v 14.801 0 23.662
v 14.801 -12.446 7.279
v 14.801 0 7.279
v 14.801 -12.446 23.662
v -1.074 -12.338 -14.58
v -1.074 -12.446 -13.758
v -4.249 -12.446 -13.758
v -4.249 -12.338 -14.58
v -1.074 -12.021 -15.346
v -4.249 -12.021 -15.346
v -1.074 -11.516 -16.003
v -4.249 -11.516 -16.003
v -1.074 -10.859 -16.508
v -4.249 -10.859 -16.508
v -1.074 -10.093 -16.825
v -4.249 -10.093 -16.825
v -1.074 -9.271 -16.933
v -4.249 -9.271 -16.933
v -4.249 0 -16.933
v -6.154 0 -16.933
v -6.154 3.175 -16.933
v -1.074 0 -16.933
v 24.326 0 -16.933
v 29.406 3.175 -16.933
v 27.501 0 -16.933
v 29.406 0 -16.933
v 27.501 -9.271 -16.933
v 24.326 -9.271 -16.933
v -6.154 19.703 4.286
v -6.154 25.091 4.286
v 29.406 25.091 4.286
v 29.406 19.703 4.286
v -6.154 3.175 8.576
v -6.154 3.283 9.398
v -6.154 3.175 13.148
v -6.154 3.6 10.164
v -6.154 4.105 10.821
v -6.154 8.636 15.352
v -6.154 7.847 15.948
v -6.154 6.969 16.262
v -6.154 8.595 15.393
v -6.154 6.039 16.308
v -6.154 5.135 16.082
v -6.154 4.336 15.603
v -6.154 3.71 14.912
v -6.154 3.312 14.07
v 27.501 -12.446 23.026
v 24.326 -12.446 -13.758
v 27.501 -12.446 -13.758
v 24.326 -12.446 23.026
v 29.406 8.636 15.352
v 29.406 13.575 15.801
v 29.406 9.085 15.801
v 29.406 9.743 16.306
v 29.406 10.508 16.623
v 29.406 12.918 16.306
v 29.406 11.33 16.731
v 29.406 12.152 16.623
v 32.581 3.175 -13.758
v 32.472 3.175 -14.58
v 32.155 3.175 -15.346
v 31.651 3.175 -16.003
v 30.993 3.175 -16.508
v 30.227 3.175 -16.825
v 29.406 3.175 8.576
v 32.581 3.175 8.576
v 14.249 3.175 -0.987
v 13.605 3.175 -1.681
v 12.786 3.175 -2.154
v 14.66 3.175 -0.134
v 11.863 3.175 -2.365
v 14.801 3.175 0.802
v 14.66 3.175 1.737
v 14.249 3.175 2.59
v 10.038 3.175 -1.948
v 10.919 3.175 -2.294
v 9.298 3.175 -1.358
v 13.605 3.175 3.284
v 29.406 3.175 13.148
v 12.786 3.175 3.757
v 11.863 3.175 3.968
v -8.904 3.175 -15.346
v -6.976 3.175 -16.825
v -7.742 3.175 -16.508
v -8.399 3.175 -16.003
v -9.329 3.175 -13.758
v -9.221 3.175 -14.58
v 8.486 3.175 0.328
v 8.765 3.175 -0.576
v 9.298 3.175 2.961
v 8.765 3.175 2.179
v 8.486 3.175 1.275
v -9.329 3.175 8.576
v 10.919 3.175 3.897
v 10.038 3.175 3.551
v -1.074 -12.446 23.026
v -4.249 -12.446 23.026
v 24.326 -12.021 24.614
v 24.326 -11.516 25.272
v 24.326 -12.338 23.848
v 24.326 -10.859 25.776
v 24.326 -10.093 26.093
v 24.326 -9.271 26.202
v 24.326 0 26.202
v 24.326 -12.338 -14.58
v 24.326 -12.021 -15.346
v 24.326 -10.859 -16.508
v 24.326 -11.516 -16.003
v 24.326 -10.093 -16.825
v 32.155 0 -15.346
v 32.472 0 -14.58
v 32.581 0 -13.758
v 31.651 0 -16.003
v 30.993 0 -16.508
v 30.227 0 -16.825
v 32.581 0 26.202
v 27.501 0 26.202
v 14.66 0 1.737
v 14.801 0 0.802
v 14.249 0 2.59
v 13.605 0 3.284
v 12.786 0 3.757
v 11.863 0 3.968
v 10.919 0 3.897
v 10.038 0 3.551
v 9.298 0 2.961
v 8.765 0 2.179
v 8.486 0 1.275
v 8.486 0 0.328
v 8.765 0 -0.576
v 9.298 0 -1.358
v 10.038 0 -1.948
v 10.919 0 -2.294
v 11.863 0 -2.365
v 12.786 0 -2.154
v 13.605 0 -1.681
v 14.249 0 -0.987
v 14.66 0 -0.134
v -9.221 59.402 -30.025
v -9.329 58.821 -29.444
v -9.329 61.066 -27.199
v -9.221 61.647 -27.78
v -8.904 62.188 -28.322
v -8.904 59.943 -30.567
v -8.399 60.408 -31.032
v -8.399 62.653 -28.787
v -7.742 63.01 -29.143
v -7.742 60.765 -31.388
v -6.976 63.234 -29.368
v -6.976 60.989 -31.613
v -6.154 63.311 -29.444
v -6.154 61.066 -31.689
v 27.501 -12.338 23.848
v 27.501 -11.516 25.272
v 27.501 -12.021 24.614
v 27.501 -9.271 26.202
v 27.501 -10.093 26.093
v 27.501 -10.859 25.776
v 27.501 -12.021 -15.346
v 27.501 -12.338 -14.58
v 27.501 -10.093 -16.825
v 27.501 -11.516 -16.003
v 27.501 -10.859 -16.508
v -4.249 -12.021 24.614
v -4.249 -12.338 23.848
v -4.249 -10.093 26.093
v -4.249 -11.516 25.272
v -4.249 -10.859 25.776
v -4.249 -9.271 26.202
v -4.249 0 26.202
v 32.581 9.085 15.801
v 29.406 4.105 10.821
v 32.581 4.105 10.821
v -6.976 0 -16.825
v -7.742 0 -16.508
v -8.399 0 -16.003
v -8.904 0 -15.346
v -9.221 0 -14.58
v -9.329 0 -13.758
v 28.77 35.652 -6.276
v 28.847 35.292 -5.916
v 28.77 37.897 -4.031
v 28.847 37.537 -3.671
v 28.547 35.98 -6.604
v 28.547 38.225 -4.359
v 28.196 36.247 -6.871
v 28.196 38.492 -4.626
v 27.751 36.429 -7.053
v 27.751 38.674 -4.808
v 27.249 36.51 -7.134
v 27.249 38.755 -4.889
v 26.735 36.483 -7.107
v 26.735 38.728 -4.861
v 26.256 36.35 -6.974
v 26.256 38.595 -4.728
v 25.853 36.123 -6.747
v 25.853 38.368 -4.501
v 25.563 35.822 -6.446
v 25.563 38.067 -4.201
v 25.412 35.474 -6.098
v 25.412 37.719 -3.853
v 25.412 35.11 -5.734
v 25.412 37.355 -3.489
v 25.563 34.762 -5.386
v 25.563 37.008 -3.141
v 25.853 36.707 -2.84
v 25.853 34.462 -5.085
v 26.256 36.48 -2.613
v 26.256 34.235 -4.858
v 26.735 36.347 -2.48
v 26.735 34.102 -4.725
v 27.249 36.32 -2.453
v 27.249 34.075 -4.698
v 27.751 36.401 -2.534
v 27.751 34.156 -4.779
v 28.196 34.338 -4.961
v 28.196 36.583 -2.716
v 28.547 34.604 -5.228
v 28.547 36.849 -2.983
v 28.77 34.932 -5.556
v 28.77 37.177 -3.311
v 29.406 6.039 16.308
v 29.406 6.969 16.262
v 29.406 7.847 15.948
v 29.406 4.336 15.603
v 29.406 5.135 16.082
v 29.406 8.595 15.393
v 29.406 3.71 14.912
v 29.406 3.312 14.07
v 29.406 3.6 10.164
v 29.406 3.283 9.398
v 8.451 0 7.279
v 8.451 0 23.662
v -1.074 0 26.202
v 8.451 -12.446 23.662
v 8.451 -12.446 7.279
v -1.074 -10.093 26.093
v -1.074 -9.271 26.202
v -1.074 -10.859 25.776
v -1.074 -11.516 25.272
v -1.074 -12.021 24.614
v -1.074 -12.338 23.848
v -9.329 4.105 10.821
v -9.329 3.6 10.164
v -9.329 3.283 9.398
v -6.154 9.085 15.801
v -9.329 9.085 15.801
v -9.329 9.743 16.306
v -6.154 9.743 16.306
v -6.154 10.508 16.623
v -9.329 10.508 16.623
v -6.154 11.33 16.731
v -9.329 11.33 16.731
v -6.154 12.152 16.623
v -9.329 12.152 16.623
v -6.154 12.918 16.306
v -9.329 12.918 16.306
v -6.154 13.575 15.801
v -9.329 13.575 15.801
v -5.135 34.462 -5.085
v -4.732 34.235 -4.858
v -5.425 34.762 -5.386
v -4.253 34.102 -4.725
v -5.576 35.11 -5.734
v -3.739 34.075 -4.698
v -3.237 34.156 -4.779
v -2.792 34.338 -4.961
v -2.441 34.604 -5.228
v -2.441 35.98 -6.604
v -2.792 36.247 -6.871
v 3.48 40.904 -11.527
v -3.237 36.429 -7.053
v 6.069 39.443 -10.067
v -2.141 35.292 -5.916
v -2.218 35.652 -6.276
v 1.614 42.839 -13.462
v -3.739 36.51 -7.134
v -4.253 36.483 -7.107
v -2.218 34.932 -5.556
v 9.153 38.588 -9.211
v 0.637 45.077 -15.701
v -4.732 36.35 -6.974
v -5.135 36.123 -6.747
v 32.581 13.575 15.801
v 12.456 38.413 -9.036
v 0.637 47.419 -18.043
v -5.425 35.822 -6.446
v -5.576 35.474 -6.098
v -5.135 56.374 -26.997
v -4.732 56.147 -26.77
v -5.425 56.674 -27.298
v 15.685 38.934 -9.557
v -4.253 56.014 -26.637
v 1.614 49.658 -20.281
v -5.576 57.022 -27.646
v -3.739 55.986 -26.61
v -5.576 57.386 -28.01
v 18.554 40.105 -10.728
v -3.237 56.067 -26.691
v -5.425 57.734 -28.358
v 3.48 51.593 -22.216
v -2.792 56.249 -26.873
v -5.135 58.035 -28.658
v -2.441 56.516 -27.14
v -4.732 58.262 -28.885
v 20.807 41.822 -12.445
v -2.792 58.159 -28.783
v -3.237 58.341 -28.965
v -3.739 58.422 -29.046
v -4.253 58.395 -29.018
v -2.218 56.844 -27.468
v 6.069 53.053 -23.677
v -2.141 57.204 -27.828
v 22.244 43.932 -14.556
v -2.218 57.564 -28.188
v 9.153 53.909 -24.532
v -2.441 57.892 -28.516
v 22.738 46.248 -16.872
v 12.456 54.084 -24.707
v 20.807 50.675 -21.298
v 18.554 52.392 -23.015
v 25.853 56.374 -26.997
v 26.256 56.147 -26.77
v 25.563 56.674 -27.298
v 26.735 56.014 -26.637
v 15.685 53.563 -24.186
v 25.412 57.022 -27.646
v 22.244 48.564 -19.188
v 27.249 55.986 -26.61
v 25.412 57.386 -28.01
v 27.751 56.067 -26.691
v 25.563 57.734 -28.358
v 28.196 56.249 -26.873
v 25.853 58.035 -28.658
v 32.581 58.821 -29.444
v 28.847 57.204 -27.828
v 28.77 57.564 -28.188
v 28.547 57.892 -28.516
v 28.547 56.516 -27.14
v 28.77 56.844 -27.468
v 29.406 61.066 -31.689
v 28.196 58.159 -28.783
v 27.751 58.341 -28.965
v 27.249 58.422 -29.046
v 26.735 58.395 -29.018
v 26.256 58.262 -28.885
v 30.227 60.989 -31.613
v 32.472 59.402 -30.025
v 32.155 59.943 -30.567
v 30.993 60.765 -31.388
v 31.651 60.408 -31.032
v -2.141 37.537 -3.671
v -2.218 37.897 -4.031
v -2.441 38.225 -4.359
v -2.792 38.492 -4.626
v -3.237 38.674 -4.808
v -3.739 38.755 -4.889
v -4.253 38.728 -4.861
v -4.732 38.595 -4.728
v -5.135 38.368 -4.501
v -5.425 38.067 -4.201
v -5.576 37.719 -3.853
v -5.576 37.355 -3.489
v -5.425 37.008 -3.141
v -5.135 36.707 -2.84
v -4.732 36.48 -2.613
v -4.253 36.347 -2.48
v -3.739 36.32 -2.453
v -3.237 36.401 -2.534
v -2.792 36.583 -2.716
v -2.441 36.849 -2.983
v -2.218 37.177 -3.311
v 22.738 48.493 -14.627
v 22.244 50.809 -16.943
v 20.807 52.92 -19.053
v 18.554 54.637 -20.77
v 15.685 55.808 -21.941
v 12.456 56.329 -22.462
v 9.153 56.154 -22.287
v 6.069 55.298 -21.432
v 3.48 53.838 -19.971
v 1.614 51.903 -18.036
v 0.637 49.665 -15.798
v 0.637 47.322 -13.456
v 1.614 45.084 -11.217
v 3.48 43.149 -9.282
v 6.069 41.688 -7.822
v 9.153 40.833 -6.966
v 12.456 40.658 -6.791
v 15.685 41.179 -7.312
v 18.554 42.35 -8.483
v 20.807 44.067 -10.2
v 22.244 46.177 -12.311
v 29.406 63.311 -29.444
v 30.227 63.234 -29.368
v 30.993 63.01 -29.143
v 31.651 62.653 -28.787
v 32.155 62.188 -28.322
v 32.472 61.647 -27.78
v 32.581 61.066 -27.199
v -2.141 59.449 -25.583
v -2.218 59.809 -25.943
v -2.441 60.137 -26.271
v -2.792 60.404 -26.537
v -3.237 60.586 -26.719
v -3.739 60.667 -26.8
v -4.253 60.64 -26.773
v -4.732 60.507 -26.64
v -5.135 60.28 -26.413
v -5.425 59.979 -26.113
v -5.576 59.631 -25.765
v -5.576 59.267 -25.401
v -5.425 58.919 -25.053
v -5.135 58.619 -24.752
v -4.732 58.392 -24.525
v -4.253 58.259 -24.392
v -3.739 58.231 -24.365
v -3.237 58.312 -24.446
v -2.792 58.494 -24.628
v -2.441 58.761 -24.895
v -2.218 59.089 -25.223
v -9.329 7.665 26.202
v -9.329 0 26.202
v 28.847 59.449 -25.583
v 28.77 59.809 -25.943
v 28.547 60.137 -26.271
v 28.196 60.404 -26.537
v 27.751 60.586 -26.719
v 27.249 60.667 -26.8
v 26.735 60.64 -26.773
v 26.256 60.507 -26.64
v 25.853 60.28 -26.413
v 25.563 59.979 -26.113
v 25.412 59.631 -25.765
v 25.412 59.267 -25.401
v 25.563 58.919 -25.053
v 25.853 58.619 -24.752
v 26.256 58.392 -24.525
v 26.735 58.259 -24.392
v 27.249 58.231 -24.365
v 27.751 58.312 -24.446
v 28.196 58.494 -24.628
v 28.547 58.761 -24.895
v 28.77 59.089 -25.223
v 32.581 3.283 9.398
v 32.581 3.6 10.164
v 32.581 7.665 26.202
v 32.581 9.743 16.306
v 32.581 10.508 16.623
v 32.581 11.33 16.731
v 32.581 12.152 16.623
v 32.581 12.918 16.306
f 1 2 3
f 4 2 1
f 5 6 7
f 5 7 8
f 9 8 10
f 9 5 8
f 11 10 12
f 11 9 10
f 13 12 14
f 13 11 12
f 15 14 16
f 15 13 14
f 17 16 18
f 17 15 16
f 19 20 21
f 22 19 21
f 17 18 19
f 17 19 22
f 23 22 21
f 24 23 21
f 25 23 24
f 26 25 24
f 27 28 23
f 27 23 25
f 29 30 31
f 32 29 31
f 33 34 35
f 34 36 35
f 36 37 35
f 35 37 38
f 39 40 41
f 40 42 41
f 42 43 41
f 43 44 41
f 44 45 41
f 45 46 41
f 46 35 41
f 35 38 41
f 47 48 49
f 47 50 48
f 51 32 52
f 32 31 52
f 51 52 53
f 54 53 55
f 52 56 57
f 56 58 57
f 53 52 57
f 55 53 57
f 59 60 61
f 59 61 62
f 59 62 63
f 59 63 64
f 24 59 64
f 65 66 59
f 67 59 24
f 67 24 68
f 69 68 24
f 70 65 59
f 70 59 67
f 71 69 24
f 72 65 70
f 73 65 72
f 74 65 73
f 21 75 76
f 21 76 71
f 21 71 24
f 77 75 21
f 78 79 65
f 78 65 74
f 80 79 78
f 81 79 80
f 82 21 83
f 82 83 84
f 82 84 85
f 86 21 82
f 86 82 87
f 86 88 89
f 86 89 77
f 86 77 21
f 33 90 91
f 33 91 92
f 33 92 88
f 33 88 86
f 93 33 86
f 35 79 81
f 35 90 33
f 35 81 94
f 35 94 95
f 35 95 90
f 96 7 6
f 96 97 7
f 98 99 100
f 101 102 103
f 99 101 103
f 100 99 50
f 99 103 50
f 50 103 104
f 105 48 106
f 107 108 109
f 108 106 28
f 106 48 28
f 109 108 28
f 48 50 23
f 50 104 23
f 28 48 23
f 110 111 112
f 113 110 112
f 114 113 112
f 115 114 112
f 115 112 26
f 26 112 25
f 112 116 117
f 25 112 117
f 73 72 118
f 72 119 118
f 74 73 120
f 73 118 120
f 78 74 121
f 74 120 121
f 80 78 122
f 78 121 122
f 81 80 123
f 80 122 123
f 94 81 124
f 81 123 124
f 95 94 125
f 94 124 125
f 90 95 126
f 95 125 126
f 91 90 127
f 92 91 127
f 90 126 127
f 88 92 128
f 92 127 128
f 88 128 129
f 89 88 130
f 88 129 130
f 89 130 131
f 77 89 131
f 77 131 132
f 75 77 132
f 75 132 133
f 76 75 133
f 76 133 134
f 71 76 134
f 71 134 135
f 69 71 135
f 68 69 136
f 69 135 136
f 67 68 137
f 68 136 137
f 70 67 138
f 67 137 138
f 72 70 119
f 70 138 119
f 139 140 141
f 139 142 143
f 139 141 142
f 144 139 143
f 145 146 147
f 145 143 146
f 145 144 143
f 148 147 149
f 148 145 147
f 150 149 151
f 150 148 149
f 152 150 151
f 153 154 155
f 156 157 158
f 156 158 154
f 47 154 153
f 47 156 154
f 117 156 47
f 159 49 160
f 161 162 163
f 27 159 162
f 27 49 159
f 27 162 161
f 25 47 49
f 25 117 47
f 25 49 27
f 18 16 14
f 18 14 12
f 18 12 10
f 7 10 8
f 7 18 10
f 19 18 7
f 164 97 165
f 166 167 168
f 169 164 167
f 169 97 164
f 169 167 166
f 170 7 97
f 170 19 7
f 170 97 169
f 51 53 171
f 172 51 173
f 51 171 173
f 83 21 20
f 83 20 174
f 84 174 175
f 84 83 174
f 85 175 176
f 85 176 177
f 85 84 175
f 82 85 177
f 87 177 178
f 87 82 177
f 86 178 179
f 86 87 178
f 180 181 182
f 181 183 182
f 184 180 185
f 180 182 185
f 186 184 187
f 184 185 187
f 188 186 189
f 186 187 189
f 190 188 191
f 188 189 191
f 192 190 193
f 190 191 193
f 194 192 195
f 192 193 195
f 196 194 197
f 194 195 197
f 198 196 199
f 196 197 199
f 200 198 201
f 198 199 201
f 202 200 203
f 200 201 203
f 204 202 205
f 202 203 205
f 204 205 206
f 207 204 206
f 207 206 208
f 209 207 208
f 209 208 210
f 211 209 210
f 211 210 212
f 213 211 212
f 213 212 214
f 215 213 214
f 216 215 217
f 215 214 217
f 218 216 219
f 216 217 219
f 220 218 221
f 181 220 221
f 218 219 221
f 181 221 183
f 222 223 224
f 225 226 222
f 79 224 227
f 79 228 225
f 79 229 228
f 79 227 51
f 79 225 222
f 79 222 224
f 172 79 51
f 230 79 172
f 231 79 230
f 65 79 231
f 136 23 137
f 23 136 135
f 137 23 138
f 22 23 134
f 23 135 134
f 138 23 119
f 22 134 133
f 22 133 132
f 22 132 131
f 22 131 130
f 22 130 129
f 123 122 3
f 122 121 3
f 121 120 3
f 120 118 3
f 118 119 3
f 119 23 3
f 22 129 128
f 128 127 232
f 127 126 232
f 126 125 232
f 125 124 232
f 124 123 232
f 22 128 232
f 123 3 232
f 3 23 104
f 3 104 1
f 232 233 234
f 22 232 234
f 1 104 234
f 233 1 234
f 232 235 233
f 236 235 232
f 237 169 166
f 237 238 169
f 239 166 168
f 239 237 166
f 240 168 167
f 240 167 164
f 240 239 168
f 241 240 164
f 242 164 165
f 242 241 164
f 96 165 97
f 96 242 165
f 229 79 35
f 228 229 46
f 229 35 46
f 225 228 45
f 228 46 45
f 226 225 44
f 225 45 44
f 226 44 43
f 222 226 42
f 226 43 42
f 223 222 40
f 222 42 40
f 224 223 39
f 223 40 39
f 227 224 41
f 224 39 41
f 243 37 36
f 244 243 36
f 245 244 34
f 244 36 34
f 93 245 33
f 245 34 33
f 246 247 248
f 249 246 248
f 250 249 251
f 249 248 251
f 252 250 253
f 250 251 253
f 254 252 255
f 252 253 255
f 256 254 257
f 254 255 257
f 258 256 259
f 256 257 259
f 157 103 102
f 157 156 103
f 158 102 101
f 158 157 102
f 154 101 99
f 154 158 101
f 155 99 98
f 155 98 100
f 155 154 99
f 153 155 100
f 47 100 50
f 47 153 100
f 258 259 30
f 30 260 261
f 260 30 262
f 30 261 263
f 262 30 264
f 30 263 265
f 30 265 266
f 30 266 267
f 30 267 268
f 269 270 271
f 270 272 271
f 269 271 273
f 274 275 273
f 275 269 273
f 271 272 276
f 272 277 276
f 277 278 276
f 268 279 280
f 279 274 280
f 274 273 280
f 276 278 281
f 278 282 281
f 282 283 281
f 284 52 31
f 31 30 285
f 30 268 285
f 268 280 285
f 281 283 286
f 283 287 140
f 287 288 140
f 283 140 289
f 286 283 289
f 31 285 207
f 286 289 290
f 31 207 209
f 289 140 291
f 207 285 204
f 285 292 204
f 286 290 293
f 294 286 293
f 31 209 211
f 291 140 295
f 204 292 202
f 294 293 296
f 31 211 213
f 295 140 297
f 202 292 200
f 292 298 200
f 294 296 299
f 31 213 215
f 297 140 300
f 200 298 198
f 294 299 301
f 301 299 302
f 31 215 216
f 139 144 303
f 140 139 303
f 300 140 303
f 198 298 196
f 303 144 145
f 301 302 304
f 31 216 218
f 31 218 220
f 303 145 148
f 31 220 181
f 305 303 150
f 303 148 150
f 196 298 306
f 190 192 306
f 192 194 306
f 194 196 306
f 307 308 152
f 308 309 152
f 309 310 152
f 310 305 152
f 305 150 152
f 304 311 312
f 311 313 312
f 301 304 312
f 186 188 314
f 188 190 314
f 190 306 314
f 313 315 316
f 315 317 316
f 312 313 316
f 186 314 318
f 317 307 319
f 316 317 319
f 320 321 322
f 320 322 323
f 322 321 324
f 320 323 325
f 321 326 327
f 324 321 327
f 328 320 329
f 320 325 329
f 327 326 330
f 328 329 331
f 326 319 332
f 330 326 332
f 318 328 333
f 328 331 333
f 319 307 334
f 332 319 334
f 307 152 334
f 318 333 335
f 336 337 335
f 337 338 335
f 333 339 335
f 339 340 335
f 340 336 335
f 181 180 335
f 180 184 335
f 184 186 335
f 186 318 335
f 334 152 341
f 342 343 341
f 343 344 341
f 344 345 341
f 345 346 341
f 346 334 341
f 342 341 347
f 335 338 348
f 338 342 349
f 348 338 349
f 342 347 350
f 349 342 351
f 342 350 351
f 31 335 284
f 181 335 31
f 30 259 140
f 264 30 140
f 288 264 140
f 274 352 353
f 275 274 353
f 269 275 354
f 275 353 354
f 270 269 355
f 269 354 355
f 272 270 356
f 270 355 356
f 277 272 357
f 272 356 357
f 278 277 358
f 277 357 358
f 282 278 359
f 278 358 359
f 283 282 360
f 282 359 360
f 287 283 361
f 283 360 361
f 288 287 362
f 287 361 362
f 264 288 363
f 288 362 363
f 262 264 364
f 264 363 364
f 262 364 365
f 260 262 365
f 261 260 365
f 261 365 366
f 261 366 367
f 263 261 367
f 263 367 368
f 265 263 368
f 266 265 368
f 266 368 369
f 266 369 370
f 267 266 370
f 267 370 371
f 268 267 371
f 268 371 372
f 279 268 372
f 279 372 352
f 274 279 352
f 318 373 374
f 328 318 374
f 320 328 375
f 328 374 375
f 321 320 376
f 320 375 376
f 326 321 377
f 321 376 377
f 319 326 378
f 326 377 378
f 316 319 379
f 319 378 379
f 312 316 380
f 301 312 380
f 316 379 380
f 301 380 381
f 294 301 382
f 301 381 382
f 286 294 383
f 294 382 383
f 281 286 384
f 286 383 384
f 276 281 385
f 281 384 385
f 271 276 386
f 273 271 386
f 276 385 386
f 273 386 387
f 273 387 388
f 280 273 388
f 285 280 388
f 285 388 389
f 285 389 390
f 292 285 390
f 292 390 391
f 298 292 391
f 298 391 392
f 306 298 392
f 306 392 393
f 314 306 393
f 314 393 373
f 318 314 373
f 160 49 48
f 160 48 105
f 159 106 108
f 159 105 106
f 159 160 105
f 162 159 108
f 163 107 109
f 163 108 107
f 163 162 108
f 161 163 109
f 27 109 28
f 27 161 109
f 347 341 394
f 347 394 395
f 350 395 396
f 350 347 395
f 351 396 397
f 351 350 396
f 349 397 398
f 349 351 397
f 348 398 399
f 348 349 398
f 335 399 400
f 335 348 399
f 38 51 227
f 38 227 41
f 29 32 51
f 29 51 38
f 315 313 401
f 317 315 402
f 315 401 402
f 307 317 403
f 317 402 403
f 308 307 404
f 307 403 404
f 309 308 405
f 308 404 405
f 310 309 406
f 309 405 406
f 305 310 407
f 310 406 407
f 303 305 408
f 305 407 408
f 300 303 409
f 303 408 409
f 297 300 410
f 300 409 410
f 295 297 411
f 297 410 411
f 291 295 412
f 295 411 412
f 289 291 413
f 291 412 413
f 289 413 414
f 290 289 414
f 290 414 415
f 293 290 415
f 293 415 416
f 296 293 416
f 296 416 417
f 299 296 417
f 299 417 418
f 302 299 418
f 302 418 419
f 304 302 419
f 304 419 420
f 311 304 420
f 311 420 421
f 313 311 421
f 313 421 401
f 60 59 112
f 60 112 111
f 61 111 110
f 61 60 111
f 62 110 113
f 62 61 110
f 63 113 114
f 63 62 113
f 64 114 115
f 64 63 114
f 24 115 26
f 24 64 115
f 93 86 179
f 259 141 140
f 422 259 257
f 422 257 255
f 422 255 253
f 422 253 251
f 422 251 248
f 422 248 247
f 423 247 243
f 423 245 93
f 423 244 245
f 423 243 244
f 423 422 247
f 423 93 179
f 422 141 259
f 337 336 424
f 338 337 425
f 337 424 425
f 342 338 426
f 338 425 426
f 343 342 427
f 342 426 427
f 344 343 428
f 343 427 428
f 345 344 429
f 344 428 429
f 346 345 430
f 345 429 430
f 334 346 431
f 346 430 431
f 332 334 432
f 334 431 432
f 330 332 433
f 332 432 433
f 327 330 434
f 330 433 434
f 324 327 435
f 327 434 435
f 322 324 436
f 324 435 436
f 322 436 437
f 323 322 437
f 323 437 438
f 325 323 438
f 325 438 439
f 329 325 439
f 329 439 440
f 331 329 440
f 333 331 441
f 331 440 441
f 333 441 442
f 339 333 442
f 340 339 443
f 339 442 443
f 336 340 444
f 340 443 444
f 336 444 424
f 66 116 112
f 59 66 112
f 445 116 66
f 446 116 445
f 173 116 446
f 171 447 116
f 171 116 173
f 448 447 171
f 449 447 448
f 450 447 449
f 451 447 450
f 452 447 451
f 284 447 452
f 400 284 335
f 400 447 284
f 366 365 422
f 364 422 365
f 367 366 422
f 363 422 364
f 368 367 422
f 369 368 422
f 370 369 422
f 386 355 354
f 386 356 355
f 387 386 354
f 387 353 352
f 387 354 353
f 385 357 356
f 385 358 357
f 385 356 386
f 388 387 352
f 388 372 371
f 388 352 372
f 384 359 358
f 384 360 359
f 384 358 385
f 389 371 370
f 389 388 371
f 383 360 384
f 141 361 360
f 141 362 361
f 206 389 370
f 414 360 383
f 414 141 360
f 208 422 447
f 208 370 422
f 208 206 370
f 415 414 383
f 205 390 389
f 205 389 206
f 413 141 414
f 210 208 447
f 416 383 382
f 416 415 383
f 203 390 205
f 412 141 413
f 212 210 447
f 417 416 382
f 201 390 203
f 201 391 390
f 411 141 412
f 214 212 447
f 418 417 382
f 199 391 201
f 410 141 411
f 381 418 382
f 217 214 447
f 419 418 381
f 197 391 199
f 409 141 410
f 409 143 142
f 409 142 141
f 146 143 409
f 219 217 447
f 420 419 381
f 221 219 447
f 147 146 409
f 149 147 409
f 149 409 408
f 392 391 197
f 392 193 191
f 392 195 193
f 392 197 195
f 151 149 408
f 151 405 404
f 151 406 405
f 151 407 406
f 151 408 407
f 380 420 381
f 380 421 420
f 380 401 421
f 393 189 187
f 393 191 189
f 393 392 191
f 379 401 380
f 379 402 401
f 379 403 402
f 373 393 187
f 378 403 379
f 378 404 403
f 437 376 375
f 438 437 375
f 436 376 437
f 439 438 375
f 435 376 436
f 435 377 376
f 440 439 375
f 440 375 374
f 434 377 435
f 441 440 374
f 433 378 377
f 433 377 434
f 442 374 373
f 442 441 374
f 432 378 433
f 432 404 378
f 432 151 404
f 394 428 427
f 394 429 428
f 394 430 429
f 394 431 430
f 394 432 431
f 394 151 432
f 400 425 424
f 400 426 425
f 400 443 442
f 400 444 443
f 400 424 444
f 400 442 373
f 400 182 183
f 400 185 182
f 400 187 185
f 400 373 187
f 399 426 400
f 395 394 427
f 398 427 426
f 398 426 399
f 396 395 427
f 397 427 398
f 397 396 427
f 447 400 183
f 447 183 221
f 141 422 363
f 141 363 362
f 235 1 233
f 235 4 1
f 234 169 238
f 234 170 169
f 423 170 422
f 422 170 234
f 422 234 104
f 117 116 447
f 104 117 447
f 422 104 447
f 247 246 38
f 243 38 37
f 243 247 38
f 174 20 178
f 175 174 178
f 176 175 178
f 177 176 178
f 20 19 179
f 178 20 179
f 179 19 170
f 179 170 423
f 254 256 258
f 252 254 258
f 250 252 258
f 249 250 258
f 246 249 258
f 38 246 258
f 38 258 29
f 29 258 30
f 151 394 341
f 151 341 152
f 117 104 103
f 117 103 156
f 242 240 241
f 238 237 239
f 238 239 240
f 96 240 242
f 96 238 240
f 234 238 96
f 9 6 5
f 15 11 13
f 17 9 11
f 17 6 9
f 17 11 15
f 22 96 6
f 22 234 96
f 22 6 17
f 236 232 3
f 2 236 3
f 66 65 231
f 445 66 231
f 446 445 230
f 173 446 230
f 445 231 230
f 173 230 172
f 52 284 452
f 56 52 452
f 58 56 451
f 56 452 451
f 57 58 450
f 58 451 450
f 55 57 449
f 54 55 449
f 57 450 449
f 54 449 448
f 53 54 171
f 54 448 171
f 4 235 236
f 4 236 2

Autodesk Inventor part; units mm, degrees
ref_plane "YZ Plane" through (0, 0, 0) normal (1, 0, 0) x (0, 1, 0)
ref_plane "XZ Plane" through (0, 0, 0) normal (0, 1, 0) x (-1, 0, 0)
ref_plane "XY Plane" through (0, 0, 0) normal (0, 0, 1) x (1, 0, 0)
sketch "Sketch1" plane through (0, 0, 0) normal (0, 1, 0) x (-1, 0, 0)
  line L0 (9.3294, -16.9333) -> (-32.5806, -16.9333)
  line L1 (-32.5806, -16.9333) -> (-32.5806, 33.8667)
  line L2 (-32.5806, 33.8667) -> (9.3294, 33.8667)
  line L3 (9.3294, 33.8667) -> (9.3294, -16.9333)
  point P0 (0, 0)
  dimension "d0" = 50.8
  dimension "d1" = 41.91
extrude "Extrusion1" add sketch "Sketch1" along normal blind 3.175
chamfer "Chamfer1" distance 3.175 angle 45 1 edges at (11.6256, 3.175, 33.8667)
sketch "Sketch9" plane through (32.5806, 0, -16.9333) normal (1, 0, 0) x (0, 0, -1)
  line L0 (-47.625, 3.175) -> (0, 3.175) projected
  line L1 (-11.631, 34.6788) -> (-43.1349, 3.175) projected
  line L2 (-13.8761, 36.9239) -> (-11.631, 34.6788) projected
  line L3 (-34.9797, 11.3302) -> (-26.8245, 3.175)
  point P0 (-16.9333, 0)
  dimension "d15" = 33.02
extrude "Extrusion4" add sketch "Sketch9" against normal blind 3.175
sketch "Sketch10" plane through (-9.3294, 0, -16.9333) normal (-1, 0, 0) x (0, 0, 1)
  line L0 (0, 3.175) -> (47.625, 3.175) projected
  line L1 (13.8761, 36.9239) -> (11.631, 34.6788) projected
  line L2 (43.1349, 3.175) -> (11.631, 34.6788) projected
  line L3 (34.9797, 11.3302) -> (26.8245, 3.175)
  point P0 (16.9333, 0)
  dimension "d18" = 33.02
extrude "Extrusion5" add sketch "Sketch10" against normal blind 3.175
fillet "Fillet3" radius 3.175 2 edges at (-7.7419, 3.175, 9.8912) (30.9931, 3.175, 9.8912)
fillet "Fillet4" radius 3.175 2 edges at (-9.3294, 1.5875, -16.9333) (32.5806, 1.5875, -16.9333)
sketch "Sketch11" plane through (0, 0, 0) normal (0, -1, 0) x (1, 0, 0)
  line L0 (-9.3294, 26.2015) -> (32.5806, 26.2015) projected
  line L1 (-9.3294, 33.8667) -> (-9.3294, -13.7583) projected
  line L2 (-6.1544, -16.9333) -> (29.4056, -16.9333) projected
  line L3 (32.5806, -13.7583) -> (32.5806, 33.8667) projected
  line L4 (11.6256, 26.2015) -> (11.6256, -16.9333)
  line L5 (-9.3294, 0.8015) -> (32.5806, 0.8015)
  circle A0 centre (11.6256, 0.8015) radius 3.175
  point P0 (0, 0)
  dimension "d24" = 20.955
  dimension "d25" = 25.4
  dimension "d26" = 6.35
extrude "Extrusion9" cut sketch "Sketch11" against normal blind 12.446 contours A0 L5 L4 | L4 L5 A0 | L5 L4 A0 | L5 A0 L4
sketch "Sketch19" plane through (0, 0, 0) normal (0, -1, 0) x (1, 0, 0)
  circle A0 centre (11.6256, 0.8015) radius 3.175 projected
  circle A1 centre (11.6256, -9.3585) radius 3.175
  point P0 (0, 0)
  dimension "d44" = 6.35
  dimension "d45" = 10.16
  dimension "d46" = 0
extrude "Extrusion10" add sketch "Sketch19" along normal blind 12.446 contours A1
sketch "Sketch20" plane through (0, 0, 0) normal (0, -1, 0) x (1, 0, 0)
  circle A0 centre (11.6256, 0.8015) radius 3.175 projected
  circle A1 centre (11.6256, 10.9615) radius 3.175
  point P0 (0, 0)
  dimension "d49" = 6.35
  dimension "d50" = 10.16
  dimension "d51" = 0
extrude "Extrusion11" add sketch "Sketch20" along normal blind 12.446 contours A1
sketch "Sketch24" plane through (0, 0, 0) normal (0, -1, 0) x (1, 0, 0)
  circle A0 centre (11.6256, 0.8015) radius 3.175 projected
  line L0 (-9.3294, 26.2015) -> (32.5806, 26.2015) projected
  line L1 (-6.1544, -16.9333) -> (29.4056, -16.9333) projected
  line L2 (24.3256, 26.2015) -> (24.3256, -16.9333)
  line L3 (24.3256, 26.2015) -> (27.5006, 26.2015)
  line L4 (27.5006, 26.2015) -> (27.5006, -16.9333)
  line L5 (27.5006, -16.9333) -> (24.3256, -16.9333)
  line L6 (24.3256, -16.9333) -> (24.3256, 26.2015)
  point P0 (0, 0)
  dimension "d64" = 12.7
  dimension "d65" = 3.175
extrude "Extrusion14" add sketch "Sketch24" along normal blind 12.446 contours L0 L4 L1 L2
sketch "Sketch25" plane through (0, 0, 0) normal (0, -1, 0) x (1, 0, 0)
  circle A0 centre (11.6256, 0.8015) radius 3.175 projected
  line L0 (-9.3294, 26.2015) -> (24.3256, 26.2015) projected
  line L1 (-6.1544, -16.9333) -> (24.3256, -16.9333) projected
  line L2 (-1.0744, 26.2015) -> (-1.0744, -16.9333)
  line L3 (-1.0744, -16.9333) -> (-4.2494, -16.9333)
  line L4 (-4.2494, -16.9333) -> (-4.2494, 26.2015)
  line L5 (-4.2494, 26.2015) -> (-1.0744, 26.2015)
  line L6 (-1.0744, 26.2015) -> (-1.0744, -16.9333)
  point P0 (0, 0)
  dimension "d68" = 12.7
  dimension "d69" = 3.175
extrude "Extrusion15" add sketch "Sketch25" along normal blind 12.446 contours L0 L2 L1 L4
fillet "Fillet8" radius 3.175 4 edges at (25.9131, -12.446, 26.2015) (25.9131, -12.446, -16.9333) (-2.6619, -12.446, -16.9333) (-2.6619, -12.446, 26.2015)
sketch "Sketch28" plane through (-9.3294, 3.175, 30.6917) normal (0, 0.7071068, 0.7071068) x (1, 0, 0)
  line L0 (41.91, -4.4901) -> (41.91, 0) projected
  line L1 (41.91, 0) -> (0, 0) projected
  line L2 (0, 0) -> (0, -4.4901) projected
  line L3 (41.91, -4.4901) -> (0, -4.4901) projected
  line L4 (0, -4.4901) -> (41.91, -4.4901)
  line L5 (41.91, -4.4901) -> (41.91, 85.0449)
  line L6 (41.91, 85.0449) -> (0, 85.0449)
  line L7 (0, 85.0449) -> (0, -4.4901)
  point P0 (9.3294, 19.4572)
  dimension "d75" = 41.91
  dimension "d76" = 89.535
extrude "Extrusion16" add sketch "Sketch28" against normal blind 3.175 contours L1 L7 L6 L5
sketch "Sketch29" plane through (-9.3294, 0, 33.8667) normal (0, 0.7071068, 0.7071068) x (1, 0, 0)
  line L0 (41.91, 89.535) -> (0, 89.535) projected
  line L1 (0, 89.535) -> (0, 0) projected
  circle A0 centre (20.955, 68.58) radius 11.1125
  point P0 (9.3294, 23.9473)
  dimension "d79" = 22.225
  dimension "d80" = 20.955
  dimension "d81" = 20.955
extrude "Extrusion17" cut sketch "Sketch29" against normal blind 3.175
sketch "Sketch30" plane through (-9.3294, 0, 33.8667) normal (0, 0.7071068, 0.7071068) x (1, 0, 0)
  circle A0 centre (20.955, 68.58) radius 11.1125 projected
  circle A1 centre (5.461, 84.074) radius 1.7272
  point P0 (9.3294, 23.9473)
  dimension "d84" = 3.4544
  dimension "d85" = 15.494
  dimension "d86" = 15.494
extrude "Extrusion18" cut sketch "Sketch30" against normal blind 3.175 contours A1
sketch "Sketch31" plane through (-9.3294, 0, 33.8667) normal (0, 0.7071068, 0.7071068) x (1, 0, 0)
  circle A0 centre (5.461, 84.074) radius 1.7272 projected
  circle A1 centre (20.955, 68.58) radius 11.1125 projected
  circle A2 centre (5.461, 53.086) radius 1.7272
  point P0 (9.3294, 23.9473)
  dimension "d89" = 3.4544
  dimension "d90" = 3.4544
  dimension "d91" = 15.494
  dimension "d92" = 15.494
extrude "Extrusion19" cut sketch "Sketch31" against normal blind 3.175 contours A2
sketch "Sketch32" plane through (-9.3294, 0, 33.8667) normal (0, 0.7071068, 0.7071068) x (1, 0, 0)
  circle A0 centre (20.955, 68.58) radius 11.1125 projected
  circle A1 centre (36.449, 84.074) radius 1.7272
  point P0 (9.3294, 23.9473)
  dimension "d95" = 3.4544
  dimension "d96" = 15.494
  dimension "d97" = 15.494
extrude "Extrusion20" cut sketch "Sketch32" against normal blind 3.175 contours A1
sketch "Sketch33" plane through (-9.3294, 0, 33.8667) normal (0, 0.7071068, 0.7071068) x (1, 0, 0)
  circle A0 centre (20.955, 68.58) radius 11.1125 projected
  circle A1 centre (36.449, 53.086) radius 1.7272
  point P0 (9.3294, 23.9473)
  dimension "d100" = 3.4544
  dimension "d101" = 15.494
  dimension "d102" = 15.494
extrude "Extrusion21" cut sketch "Sketch33" against normal blind 3.175 contours A1
fillet "Fillet9" radius 3.175 2 edges at (-9.3294, 62.1883, -30.5667) (32.5806, 62.1883, -30.5667)
fillet "Fillet10" radius 3.175 2 edges at (30.9931, 11.3302, 18.0464) (-7.7419, 11.3302, 18.0464)
sketch "Sketch37" plane through (11.6256, -12.446, 10.9615) normal (0, -1, 0) x (1, 0, 0)
  line L0 (-15.875, 12.065) -> (-15.875, -24.7199) projected
  line L1 (-12.7, -24.7199) -> (-12.7, 12.065) projected
  circle A0 centre (0, 0) radius 3.175 projected
  line L2 (-3.175, 0) -> (3.175, 0)
  line L3 (3.175, 0) -> (3.175, 12.7)
  line L4 (3.175, 12.7) -> (-3.175, 12.7)
  line L5 (-3.175, 12.7) -> (-3.175, 0)
  point P0 (-11.6256, -10.9615)
  dimension "d111" = 3.175
  dimension "d112" = 6.35
  dimension "d113" = 12.7
extrude "Extrusion22" add sketch "Sketch37" against normal blind 12.954 contours L2 A0 | A0 L5 L4 L3 picked at (0.7922, 0.7018)
sketch "Sketch38" plane through (0, -12.446, 0) normal (0, -1, 0) x (1, 0, 0)
  line L0 (14.8006, 10.9615) -> (14.8006, 23.6615) projected
  line L1 (14.8006, 16.2386) -> (8.4506, 16.2386)
  line L2 (8.4506, 16.2386) -> (8.4506, 7.2793)
  line L3 (8.4506, 7.2793) -> (14.8006, 7.2793)
  line L4 (14.8006, 7.2793) -> (14.8006, 16.2386)
  point P0 (0, 0)
  dimension "d116" = 6.35
extrude "Extrusion23" add sketch "Sketch38" against normal blind 12.954
sketch "Sketch39" plane through (11.6256, -12.446, -9.3585) normal (0, -1, 0) x (1, 0, 0)
  line L0 (3.175, -3.175) -> (-3.175, -3.175)
  line L1 (-3.175, -3.175) -> (-3.175, 3.175)
  line L2 (-3.175, 3.175) -> (3.175, 3.175)
  line L3 (3.175, 3.175) -> (3.175, -3.175)
  point P0 (-11.6256, 9.3585)
  dimension "d119" = 6.35
  dimension "d120" = 6.35
extrude "Extrusion24" add sketch "Sketch39" against normal blind 12.954
fillet "Fillet12" radius 3.175 1 edges at (14.8006, -6.223, -12.5335)
fillet "Fillet13" radius 3.175 1 edges at (8.4506, -6.223, -12.5335)
sketch "Sketch44" plane through (32.5806, 0, 33.8667) normal (1, 0, 0) x (0, 0, -1)
  line L0 (7.6651, 0) -> (7.6651, 7.6651)
  line L1 (61.0657, 61.0657) -> (0, 0) projected
  line L2 (0, 0) -> (7.6651, 0)
  line L3 (47.625, 0) -> (0, 0) projected
  line L4 (7.6651, 7.6651) -> (0, 0)
  point P0 (33.8667, 0)
extrude "Extrusion25" cut sketch "Sketch44" against normal blind 76.2
sketch "Sketch45" plane through (-9.3294, 0.9299, 28.4466) normal (0, -0.7071068, -0.7071068) x (-1, 0, 0)
  line L0 (-38.735, 3.175) -> (-3.175, 3.175)
  line L1 (-3.175, 3.175) -> (-3.175, 34.1687)
  line L2 (-3.175, 34.1687) -> (-38.735, 34.1687)
  line L3 (-38.735, 34.1687) -> (-38.735, 3.175)
  line L4 (-3.175, 3.175) -> (-3.175, 17.8832) projected
  circle A0 centre (-36.449, 48.5959) radius 1.7272 projected
  point P0 (-9.3294, 19.4572)
  dimension "d129" = 0
  dimension "d130" = 12.7
extrude "Extrusion26" add sketch "Sketch45" along normal blind 3.81 contours L3 L2 L1 L0
chamfer "Chamfer2" distance 3.81 angle 45 1 edges at (11.6256, 22.3968, 1.5916)
fillet "Fillet14" radius 3.175 1 edges at (11.6256, 3.175, 20.8134)
sketch "Sketch47" plane through (0, -12.446, 0) normal (0, -1, 0) x (1, 0, 0)
  line L0 (14.8006, -6.1835) -> (8.4506, -6.1835)
  line L1 (8.4506, -6.1835) -> (8.4506, -12.6132)
  line L2 (8.4506, -12.6132) -> (14.8006, -12.6132)
  line L3 (14.8006, -12.6132) -> (14.8006, -6.1835)
  point P0 (0, 0)
extrude "Extrusion27" cut sketch "Sketch47" against normal blind 12.446
properties part number "slider"
